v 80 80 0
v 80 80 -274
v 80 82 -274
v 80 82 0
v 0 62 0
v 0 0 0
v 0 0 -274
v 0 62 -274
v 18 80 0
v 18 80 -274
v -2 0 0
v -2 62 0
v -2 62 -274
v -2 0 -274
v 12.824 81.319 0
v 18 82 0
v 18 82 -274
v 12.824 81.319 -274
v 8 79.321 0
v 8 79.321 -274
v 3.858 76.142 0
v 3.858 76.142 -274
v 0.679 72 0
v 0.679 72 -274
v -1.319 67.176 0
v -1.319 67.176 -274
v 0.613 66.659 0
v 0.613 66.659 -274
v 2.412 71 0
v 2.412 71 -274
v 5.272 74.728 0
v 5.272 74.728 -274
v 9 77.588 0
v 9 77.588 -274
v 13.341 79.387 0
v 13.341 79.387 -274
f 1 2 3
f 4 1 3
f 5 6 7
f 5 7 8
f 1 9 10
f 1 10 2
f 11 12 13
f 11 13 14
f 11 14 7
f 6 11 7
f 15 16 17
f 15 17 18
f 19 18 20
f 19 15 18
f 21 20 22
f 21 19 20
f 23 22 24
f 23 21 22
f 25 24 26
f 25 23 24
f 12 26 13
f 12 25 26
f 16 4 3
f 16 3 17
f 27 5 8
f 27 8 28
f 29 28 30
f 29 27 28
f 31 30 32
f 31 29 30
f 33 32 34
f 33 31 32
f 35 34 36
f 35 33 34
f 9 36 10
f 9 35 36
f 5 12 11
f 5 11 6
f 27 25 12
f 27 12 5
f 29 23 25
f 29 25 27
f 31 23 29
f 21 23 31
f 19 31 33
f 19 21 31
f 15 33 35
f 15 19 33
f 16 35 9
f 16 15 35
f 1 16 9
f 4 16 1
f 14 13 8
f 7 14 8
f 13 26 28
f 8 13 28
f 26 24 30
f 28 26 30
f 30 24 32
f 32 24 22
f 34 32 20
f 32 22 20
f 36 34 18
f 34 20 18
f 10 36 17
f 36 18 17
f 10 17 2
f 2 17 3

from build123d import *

# Parameters (mm, degrees)
BOSS_EXTRUDE1_DEPTH = 274


with BuildPart() as part:
    # Sketch1 → Boss-Extrude1 (new body)
    with BuildSketch(Plane.XY):
        with BuildLine():
            Line((0, 0), (0, 62))
            ThreePointArc((0, 62), (5.272077939, 74.727922061), (18, 80))
            Line((18, 80), (80, 80))
            Line((80, 80), (80, 82))
            Line((80, 82), (18, 82))
            ThreePointArc((18, 82), (3.857864376, 76.142135624), (-2, 62))
            Line((-2, 62), (-2, 0))
            Line((-2, 0), (0, 0))
        make_face()
    extrude(amount=-BOSS_EXTRUDE1_DEPTH)


solid = part.part
